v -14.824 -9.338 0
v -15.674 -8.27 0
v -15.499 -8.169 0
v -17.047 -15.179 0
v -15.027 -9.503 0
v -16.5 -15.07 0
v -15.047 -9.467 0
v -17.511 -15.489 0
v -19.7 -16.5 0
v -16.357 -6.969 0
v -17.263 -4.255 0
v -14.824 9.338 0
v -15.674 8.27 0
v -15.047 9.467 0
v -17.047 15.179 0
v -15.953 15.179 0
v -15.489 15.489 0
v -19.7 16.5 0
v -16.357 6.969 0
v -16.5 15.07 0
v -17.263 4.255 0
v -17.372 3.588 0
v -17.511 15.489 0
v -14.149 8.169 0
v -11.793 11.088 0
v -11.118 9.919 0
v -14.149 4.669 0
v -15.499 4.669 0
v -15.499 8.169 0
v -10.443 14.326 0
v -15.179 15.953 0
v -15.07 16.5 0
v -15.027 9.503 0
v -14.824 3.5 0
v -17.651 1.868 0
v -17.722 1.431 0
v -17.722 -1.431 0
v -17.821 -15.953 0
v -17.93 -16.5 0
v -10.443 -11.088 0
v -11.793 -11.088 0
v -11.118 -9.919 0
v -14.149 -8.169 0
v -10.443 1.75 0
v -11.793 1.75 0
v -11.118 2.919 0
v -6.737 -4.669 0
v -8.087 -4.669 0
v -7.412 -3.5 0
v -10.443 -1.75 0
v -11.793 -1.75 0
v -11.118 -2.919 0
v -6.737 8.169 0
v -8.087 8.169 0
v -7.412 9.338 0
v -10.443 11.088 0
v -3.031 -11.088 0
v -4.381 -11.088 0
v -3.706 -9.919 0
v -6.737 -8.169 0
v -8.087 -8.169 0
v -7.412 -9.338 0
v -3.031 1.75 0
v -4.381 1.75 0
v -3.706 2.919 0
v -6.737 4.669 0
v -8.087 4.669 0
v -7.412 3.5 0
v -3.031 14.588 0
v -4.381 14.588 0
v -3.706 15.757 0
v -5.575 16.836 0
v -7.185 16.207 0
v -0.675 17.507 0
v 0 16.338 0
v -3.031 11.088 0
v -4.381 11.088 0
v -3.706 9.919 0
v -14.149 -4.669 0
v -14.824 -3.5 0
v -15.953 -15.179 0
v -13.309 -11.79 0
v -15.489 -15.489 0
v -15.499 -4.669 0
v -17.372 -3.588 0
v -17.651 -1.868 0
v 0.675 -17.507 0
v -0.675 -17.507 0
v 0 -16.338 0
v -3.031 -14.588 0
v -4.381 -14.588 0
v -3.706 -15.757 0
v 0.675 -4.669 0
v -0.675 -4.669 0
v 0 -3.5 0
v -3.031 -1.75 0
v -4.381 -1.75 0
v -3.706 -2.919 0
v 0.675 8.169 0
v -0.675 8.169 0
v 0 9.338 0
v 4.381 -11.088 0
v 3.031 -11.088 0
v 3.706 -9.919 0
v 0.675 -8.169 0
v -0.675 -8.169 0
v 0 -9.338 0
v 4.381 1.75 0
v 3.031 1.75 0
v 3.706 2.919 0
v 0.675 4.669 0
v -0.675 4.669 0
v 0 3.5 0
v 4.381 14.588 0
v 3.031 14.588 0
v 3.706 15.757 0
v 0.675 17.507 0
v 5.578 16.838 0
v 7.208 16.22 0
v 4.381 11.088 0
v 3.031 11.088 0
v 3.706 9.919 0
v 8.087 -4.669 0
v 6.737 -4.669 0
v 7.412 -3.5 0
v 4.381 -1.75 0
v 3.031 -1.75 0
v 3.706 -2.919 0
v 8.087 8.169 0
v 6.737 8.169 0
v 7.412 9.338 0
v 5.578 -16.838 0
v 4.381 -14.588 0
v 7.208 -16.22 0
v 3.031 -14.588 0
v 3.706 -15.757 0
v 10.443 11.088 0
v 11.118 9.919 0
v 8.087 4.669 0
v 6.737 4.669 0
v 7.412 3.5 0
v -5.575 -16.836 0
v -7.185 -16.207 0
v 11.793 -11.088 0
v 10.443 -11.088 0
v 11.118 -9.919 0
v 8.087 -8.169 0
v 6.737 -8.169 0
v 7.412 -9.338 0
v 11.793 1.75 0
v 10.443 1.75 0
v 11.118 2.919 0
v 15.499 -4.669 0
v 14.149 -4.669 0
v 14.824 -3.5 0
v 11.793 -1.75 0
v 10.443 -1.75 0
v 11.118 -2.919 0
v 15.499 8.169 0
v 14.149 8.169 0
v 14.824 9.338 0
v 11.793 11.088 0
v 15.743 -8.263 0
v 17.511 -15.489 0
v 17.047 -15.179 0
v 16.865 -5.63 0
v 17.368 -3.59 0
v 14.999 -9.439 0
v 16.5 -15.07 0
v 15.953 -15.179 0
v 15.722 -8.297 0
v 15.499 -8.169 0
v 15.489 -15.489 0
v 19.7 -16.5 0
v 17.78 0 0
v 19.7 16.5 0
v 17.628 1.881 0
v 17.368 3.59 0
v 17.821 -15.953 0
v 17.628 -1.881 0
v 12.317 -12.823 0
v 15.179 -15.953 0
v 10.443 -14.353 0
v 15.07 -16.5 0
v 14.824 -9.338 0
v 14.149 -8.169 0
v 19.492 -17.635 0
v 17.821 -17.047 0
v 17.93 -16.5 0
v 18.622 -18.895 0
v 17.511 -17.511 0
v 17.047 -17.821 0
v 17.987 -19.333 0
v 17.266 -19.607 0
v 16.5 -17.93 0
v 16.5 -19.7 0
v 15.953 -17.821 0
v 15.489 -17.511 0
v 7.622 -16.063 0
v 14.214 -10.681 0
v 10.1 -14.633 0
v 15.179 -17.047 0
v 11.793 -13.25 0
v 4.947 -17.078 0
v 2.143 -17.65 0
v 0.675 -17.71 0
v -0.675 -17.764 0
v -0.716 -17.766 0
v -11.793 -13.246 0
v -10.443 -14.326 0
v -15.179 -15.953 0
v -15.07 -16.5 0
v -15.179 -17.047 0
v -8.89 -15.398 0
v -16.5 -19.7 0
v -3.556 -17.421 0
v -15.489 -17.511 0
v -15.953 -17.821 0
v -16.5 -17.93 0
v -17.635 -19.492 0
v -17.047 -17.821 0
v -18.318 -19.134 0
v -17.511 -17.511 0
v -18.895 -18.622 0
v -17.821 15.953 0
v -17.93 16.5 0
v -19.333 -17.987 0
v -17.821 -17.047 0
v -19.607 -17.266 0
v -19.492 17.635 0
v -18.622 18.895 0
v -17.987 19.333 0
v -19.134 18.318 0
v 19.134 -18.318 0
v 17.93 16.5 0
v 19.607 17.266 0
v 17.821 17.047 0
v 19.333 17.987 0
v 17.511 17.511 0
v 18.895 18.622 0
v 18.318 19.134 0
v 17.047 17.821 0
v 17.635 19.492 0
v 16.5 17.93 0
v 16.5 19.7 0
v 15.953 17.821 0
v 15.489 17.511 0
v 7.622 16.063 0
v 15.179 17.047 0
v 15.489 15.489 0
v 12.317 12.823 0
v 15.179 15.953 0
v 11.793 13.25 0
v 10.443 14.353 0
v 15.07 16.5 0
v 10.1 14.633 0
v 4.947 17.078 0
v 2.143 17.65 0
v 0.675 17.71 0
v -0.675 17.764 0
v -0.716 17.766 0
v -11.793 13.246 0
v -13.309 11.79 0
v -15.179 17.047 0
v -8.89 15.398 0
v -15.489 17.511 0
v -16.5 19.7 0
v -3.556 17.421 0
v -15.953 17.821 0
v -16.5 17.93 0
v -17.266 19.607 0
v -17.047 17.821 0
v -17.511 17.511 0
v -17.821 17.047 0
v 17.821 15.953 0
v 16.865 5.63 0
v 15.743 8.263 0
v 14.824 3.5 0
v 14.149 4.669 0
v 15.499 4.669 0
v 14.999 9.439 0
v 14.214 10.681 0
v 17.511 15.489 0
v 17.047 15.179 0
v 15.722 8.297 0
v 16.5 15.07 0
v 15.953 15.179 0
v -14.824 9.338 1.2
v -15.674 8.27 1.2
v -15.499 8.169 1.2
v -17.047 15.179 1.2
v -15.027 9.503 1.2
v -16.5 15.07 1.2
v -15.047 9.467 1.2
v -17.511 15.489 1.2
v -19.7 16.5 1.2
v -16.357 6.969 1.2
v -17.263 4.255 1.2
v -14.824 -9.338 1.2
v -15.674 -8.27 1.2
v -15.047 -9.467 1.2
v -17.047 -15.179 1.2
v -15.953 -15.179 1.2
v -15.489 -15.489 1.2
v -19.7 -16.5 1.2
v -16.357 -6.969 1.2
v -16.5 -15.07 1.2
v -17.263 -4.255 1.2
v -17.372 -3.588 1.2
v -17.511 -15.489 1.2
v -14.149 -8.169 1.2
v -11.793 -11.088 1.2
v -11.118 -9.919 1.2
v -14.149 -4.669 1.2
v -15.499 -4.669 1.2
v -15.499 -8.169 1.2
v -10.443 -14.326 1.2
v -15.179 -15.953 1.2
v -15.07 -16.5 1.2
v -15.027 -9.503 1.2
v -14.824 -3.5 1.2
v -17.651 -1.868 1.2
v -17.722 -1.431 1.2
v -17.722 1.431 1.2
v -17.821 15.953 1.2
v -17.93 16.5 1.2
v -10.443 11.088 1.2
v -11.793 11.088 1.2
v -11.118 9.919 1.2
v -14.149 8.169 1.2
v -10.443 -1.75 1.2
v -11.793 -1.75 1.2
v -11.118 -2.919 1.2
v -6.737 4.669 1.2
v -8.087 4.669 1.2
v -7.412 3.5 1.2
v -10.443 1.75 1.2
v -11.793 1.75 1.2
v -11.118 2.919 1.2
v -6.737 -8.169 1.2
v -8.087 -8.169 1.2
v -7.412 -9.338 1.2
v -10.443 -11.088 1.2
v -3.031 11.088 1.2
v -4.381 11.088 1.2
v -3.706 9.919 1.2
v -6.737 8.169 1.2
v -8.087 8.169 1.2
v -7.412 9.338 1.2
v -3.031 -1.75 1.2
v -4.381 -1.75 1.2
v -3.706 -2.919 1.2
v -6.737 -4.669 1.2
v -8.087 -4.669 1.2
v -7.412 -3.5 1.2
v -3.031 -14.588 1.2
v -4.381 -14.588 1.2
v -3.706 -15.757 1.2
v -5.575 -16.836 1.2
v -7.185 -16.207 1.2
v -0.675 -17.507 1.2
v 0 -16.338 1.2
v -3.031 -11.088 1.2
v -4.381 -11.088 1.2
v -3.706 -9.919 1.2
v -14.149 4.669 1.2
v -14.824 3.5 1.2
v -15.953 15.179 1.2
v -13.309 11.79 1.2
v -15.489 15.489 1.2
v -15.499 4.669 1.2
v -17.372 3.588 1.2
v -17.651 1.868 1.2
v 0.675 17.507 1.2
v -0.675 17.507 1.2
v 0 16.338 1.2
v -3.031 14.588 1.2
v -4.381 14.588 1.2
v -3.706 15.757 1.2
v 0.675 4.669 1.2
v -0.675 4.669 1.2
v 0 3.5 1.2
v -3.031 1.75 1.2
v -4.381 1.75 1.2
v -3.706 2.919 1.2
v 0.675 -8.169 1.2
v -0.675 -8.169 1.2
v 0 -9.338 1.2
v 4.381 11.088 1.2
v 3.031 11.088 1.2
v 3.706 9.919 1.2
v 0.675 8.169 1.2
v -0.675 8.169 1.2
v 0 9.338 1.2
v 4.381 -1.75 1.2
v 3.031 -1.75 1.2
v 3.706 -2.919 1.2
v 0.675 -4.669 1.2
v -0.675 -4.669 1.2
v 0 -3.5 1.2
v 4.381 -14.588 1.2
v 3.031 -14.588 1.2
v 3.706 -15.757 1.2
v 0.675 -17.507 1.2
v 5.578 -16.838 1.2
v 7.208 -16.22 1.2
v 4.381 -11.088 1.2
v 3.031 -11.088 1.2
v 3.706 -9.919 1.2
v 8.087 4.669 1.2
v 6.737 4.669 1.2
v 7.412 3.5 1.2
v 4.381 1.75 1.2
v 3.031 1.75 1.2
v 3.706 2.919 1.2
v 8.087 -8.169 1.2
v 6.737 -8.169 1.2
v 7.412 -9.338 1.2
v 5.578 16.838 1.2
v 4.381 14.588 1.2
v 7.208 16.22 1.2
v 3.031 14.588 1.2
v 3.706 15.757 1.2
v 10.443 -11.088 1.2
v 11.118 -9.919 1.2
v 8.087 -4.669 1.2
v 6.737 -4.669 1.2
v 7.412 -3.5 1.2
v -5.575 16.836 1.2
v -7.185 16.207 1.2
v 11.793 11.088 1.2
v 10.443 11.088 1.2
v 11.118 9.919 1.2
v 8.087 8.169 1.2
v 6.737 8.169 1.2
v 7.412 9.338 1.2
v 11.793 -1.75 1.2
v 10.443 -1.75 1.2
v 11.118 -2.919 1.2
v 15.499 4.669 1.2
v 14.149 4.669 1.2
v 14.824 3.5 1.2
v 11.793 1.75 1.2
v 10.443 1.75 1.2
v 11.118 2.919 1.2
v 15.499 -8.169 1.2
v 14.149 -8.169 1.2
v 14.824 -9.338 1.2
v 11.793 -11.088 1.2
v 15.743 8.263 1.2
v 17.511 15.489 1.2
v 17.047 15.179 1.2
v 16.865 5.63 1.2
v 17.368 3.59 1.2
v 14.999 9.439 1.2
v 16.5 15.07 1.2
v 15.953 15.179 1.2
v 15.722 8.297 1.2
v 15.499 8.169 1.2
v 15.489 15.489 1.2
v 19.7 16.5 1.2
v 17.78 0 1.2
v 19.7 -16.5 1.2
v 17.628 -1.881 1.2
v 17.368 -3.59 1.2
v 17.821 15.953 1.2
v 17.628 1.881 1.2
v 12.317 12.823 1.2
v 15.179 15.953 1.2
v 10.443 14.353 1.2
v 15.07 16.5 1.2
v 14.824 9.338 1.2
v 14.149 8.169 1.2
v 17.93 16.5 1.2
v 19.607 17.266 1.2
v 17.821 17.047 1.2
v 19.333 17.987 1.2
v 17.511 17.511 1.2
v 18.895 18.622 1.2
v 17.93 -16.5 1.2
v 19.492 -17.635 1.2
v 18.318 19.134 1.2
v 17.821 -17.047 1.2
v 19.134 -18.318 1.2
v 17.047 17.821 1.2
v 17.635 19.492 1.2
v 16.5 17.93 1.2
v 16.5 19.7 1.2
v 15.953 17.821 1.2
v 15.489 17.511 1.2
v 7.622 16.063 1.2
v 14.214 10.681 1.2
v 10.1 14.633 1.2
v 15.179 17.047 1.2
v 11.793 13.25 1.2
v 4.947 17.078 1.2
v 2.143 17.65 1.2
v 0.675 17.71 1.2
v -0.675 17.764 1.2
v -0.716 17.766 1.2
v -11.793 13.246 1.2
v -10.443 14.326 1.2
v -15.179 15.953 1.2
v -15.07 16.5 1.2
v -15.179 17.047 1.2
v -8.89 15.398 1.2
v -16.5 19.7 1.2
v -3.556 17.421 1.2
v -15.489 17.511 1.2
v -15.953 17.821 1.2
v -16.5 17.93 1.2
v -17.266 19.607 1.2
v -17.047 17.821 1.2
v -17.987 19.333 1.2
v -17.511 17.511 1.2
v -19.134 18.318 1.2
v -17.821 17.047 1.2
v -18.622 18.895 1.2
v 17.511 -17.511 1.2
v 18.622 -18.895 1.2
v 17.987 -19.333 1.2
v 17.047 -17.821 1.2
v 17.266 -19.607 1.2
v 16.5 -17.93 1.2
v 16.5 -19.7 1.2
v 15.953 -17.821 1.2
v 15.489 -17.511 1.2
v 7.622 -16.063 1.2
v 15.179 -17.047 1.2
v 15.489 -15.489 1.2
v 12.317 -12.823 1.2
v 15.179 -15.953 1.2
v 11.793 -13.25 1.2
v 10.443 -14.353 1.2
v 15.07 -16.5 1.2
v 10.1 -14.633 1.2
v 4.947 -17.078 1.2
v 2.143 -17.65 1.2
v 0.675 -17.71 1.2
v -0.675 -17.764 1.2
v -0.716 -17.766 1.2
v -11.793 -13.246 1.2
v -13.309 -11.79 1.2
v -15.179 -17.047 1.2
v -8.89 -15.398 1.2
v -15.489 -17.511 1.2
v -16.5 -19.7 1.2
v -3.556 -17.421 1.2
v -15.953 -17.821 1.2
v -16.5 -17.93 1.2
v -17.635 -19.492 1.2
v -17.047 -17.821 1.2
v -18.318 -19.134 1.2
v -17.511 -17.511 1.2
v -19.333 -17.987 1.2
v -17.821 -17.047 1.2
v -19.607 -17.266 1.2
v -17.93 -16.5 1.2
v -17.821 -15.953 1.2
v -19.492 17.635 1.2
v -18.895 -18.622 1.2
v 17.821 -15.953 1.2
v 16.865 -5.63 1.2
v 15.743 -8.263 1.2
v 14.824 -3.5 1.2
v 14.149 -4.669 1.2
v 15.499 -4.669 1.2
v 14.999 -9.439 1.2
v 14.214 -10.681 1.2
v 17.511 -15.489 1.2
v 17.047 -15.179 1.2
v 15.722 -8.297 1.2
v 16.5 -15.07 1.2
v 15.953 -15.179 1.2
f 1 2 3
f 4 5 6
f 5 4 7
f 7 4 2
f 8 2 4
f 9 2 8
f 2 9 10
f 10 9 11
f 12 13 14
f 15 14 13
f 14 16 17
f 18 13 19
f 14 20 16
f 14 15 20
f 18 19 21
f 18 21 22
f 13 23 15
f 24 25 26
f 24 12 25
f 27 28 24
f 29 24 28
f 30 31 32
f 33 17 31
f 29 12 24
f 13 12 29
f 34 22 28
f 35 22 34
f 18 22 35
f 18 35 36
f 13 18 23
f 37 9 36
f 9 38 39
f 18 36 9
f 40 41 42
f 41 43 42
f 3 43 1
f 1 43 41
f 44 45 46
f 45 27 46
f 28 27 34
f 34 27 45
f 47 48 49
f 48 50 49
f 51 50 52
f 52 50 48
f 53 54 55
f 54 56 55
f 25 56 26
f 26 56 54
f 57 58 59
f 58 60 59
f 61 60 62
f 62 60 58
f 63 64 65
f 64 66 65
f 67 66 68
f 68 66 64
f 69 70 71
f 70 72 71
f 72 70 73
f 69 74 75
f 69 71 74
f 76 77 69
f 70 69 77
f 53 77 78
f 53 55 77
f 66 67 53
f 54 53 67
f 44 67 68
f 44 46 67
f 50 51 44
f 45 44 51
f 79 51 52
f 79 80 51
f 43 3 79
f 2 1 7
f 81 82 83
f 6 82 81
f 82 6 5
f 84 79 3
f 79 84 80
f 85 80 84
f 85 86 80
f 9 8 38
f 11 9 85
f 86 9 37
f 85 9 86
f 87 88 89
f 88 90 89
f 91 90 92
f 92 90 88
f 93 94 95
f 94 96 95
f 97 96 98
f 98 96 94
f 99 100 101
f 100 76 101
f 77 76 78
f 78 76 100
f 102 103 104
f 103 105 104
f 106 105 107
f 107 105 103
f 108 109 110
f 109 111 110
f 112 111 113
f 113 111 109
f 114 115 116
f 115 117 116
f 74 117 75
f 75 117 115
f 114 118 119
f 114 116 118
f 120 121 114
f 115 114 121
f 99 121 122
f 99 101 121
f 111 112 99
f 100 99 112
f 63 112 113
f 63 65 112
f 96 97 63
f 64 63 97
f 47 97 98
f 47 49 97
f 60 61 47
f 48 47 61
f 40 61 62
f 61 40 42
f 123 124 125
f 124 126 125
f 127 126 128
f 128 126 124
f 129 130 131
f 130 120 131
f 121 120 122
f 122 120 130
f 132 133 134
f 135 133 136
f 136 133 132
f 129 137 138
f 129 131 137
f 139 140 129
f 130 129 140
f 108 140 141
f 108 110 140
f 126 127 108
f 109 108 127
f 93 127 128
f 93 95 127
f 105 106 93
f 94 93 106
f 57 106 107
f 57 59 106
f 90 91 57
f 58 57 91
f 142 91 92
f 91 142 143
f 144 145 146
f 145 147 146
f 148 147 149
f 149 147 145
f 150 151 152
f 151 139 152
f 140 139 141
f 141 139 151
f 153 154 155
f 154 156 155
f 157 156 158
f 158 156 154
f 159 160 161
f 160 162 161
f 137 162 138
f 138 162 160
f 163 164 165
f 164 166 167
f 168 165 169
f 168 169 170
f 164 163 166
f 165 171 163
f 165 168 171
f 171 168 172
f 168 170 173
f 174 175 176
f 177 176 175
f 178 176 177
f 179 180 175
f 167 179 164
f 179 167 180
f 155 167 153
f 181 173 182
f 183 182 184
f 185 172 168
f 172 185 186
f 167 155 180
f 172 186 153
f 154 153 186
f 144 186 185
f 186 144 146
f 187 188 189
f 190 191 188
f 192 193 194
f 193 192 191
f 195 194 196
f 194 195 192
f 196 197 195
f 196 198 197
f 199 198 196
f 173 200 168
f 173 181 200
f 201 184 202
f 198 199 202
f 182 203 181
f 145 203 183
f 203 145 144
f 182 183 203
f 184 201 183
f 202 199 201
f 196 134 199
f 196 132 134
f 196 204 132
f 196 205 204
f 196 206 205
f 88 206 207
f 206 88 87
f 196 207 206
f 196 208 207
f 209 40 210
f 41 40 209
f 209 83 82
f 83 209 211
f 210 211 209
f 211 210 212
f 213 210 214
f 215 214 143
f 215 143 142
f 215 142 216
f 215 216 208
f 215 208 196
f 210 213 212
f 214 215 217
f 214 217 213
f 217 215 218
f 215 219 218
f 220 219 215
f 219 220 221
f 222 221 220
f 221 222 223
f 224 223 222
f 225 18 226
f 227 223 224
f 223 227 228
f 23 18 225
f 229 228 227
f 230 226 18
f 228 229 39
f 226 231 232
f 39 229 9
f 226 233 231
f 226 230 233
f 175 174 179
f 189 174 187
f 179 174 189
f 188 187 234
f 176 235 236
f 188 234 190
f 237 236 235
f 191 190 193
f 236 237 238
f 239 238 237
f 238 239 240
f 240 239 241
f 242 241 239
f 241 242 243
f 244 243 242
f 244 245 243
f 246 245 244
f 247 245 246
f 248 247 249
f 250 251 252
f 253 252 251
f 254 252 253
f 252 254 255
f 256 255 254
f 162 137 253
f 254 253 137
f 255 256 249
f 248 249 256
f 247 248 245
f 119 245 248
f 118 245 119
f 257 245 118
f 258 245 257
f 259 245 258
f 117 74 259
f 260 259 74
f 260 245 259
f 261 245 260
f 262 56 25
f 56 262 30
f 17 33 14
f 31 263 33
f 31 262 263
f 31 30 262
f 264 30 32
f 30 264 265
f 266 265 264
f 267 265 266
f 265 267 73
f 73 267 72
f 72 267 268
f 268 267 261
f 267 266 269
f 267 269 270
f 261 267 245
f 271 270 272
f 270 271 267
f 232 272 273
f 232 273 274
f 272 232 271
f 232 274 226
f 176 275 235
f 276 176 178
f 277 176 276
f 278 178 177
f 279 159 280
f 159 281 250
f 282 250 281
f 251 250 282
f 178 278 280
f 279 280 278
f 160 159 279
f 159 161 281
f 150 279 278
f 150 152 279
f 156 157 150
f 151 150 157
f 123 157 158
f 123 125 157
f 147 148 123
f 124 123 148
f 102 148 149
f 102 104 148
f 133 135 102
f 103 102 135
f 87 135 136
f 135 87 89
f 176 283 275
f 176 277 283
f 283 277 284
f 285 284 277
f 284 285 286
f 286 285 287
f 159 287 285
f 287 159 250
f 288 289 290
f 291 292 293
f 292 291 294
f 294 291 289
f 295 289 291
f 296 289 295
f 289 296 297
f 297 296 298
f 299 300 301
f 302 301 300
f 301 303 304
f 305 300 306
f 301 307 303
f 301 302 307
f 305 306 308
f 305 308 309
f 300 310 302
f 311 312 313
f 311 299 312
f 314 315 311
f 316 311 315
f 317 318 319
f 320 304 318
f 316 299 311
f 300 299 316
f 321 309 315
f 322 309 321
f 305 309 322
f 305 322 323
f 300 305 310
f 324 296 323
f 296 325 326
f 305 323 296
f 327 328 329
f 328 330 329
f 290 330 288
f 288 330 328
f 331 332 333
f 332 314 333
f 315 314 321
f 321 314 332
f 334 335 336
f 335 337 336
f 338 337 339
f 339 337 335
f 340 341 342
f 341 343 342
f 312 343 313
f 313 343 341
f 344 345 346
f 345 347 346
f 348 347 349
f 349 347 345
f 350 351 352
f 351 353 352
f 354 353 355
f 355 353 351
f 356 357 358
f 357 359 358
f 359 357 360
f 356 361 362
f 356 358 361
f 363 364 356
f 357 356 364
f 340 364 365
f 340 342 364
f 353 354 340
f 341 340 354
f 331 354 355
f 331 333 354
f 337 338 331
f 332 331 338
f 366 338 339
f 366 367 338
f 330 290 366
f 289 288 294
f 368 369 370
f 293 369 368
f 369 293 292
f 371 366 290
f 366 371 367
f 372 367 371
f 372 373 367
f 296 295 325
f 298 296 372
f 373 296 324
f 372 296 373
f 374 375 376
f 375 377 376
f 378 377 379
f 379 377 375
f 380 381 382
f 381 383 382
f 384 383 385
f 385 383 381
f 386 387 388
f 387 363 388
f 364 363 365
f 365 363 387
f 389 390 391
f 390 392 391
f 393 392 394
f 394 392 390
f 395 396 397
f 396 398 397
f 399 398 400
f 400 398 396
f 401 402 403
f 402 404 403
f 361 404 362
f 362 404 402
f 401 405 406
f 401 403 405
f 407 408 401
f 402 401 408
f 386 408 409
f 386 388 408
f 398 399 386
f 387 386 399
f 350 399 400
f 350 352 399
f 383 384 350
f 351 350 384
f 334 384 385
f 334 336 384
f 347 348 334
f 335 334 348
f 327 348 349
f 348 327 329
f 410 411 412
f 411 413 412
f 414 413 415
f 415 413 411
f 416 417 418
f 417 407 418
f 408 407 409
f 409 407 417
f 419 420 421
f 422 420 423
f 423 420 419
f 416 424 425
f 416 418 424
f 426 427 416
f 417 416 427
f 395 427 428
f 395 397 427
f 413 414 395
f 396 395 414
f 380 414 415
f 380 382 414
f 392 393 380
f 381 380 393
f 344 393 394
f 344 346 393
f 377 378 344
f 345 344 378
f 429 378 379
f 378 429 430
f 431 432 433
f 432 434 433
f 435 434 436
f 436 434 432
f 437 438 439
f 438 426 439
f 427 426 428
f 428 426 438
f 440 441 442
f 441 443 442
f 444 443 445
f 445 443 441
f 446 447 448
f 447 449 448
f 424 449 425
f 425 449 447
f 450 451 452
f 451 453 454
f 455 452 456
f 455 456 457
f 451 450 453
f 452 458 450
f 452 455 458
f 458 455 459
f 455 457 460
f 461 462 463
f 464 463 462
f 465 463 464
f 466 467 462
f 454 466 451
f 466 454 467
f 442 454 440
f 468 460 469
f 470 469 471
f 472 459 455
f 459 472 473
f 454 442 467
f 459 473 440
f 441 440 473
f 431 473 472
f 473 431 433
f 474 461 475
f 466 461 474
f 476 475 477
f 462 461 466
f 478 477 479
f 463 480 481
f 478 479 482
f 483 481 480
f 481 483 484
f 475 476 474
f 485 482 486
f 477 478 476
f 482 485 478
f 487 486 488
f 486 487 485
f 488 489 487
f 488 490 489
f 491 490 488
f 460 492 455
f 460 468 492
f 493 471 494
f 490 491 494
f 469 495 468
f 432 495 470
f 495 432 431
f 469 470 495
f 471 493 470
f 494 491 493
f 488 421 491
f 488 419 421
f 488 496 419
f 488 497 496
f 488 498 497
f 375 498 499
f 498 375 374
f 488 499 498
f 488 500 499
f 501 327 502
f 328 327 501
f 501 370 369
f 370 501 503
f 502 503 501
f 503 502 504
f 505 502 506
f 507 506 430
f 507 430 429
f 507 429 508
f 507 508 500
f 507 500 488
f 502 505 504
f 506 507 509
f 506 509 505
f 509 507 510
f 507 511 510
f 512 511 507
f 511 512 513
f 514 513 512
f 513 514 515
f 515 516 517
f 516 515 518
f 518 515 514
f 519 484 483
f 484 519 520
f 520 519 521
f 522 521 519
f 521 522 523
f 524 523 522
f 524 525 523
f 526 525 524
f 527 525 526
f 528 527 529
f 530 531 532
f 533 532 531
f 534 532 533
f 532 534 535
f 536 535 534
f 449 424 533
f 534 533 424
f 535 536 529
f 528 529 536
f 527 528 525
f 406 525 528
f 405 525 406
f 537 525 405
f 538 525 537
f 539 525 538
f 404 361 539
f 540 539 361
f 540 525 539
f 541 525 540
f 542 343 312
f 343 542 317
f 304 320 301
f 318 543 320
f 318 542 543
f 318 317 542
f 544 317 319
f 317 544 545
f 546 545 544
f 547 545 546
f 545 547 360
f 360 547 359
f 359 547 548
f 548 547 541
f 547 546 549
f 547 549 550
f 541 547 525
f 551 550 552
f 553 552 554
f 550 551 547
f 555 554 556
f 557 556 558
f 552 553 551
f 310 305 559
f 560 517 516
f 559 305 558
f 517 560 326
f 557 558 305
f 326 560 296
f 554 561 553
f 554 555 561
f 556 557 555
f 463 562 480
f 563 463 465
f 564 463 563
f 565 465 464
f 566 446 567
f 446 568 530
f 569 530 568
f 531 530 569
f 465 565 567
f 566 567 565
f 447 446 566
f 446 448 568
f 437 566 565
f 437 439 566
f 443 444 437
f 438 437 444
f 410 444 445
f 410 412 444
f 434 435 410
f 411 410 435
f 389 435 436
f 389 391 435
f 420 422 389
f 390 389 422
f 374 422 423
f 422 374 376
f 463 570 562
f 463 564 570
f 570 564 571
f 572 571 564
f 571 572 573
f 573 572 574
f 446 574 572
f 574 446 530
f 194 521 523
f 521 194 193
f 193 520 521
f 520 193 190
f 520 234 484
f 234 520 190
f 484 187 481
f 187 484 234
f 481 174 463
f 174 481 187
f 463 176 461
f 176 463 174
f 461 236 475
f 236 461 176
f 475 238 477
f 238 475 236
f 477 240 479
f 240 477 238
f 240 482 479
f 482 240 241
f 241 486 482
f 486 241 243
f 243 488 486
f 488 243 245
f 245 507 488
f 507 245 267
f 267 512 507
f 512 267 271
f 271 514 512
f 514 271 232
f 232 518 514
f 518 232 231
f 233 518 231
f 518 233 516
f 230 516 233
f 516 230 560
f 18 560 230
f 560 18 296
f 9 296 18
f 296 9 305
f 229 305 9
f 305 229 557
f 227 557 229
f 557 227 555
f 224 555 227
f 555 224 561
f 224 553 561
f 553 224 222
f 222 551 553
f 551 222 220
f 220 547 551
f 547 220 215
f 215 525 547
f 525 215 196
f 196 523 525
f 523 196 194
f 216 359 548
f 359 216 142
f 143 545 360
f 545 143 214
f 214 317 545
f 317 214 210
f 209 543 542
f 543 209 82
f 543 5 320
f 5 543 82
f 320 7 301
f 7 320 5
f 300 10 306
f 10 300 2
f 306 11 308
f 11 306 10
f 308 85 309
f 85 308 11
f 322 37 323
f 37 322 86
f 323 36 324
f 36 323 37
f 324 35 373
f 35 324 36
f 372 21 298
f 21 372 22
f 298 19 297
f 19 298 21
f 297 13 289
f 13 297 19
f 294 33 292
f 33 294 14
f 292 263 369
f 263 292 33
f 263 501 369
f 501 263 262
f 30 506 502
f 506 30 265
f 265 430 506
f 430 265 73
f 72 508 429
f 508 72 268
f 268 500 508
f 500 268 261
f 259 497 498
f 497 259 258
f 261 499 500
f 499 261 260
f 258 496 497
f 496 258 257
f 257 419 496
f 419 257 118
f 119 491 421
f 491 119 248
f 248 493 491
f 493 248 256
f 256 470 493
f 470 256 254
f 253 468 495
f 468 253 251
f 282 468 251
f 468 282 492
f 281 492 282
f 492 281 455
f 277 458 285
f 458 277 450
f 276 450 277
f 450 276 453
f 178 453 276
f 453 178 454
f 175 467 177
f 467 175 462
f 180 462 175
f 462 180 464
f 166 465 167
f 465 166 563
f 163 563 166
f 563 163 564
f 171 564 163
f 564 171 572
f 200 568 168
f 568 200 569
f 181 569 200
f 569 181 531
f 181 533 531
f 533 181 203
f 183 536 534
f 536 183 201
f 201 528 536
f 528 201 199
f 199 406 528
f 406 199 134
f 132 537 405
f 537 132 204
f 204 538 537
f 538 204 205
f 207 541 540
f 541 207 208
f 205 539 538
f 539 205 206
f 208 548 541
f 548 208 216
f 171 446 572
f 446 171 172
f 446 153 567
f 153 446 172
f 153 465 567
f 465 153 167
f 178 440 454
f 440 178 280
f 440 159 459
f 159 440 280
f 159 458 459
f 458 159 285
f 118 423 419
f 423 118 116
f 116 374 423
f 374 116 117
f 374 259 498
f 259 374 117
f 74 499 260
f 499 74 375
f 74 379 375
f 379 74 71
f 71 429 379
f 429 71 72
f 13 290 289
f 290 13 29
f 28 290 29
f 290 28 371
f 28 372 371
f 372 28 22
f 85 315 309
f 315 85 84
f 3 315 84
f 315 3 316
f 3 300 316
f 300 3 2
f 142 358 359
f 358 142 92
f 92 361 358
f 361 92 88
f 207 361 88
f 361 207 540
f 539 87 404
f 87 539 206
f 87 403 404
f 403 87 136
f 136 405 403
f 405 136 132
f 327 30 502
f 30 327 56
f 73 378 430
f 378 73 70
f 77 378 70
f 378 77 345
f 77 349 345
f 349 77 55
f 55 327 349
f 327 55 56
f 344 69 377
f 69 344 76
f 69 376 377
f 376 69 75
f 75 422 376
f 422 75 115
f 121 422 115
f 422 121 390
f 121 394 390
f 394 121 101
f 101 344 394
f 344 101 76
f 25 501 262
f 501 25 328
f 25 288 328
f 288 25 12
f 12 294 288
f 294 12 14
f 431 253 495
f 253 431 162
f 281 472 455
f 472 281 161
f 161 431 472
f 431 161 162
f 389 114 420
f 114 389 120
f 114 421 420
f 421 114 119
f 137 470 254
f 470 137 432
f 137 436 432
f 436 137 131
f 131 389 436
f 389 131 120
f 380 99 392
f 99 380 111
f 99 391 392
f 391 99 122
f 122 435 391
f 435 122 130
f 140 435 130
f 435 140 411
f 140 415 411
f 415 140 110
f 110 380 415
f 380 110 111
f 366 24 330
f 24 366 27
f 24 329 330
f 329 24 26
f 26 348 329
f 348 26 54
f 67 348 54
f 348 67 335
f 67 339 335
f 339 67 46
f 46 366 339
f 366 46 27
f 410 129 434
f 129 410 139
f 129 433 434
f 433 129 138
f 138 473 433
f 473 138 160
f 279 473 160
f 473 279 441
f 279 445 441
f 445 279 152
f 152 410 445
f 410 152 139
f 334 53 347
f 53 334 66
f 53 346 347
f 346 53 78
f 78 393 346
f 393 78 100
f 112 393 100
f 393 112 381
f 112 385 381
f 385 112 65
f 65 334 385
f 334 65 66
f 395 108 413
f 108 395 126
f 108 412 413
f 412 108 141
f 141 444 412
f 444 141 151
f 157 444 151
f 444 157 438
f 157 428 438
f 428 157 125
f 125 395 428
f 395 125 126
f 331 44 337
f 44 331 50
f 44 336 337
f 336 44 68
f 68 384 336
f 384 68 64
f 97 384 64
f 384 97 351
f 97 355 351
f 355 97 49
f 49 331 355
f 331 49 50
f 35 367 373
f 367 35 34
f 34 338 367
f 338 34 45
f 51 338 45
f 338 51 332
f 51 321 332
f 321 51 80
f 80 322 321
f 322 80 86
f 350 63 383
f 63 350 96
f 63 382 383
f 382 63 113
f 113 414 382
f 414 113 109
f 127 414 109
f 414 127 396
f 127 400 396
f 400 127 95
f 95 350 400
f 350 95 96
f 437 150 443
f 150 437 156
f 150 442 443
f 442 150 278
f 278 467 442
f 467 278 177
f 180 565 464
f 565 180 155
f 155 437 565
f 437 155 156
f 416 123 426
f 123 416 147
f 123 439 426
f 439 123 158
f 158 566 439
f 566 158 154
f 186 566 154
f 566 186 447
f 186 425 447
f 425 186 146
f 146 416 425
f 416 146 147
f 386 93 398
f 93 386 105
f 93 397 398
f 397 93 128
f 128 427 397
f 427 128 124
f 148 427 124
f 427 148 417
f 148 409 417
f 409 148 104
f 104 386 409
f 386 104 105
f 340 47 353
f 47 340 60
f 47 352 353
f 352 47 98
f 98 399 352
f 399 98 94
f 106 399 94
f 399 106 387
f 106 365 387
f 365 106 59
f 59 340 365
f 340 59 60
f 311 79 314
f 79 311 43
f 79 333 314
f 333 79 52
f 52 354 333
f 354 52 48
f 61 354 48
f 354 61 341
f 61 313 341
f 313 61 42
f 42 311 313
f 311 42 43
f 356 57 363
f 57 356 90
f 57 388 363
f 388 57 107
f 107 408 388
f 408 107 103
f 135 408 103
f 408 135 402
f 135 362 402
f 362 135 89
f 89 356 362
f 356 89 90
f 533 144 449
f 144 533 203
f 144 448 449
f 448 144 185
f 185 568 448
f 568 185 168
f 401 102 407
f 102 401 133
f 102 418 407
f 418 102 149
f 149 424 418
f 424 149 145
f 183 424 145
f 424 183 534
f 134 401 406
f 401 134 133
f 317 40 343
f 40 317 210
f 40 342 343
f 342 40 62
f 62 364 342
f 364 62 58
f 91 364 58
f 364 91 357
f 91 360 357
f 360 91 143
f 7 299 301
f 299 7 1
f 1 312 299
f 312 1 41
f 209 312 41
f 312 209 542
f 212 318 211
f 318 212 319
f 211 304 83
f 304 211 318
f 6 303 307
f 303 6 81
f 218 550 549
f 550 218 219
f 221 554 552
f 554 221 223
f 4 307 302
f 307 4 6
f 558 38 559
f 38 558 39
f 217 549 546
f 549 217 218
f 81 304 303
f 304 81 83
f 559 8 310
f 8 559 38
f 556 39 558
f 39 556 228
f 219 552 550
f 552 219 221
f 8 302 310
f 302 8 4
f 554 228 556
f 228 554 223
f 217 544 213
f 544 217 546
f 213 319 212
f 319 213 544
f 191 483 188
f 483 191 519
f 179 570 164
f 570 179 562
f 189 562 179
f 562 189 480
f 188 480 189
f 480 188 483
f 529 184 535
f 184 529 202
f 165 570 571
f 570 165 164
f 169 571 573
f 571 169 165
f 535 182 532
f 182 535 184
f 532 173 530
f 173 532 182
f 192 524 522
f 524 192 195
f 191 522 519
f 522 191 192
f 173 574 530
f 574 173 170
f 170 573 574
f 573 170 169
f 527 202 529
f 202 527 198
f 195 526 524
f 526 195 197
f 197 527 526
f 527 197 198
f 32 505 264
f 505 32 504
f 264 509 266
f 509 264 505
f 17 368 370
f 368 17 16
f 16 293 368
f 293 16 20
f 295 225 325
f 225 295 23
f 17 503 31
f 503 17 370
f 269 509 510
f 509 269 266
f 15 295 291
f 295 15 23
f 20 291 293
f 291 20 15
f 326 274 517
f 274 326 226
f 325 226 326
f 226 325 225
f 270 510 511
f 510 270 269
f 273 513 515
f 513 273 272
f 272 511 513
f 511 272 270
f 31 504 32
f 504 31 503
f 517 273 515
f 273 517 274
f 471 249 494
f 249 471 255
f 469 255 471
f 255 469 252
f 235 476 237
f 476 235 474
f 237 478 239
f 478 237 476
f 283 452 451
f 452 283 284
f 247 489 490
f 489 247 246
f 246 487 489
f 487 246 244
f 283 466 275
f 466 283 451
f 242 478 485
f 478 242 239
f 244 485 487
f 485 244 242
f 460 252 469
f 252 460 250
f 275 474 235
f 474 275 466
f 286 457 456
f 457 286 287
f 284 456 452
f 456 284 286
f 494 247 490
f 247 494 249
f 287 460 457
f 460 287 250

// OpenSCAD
/*
 * Customizable Fan Cover - https://www.thingiverse.com/thing:2802474
 * by Dennis Hofmann - https://www.thingiverse.com/mightynozzle/about
 * created 2018-02-22
 * updated 2018-03-27
 * version v1.2
 *
 * Changelog
 * --------------
 * v1.2:
 *      - better quality of rounded corners and crosshair pattern
 * v1.1:
 *      - added support line option for crosshair and square pattern
 * v1.0:
 *      - final design
 * --------------
 *
 * This work is licensed under the Creative Commons - Attribution - Non-Commercial - ShareAlike license.
 * https://creativecommons.org/licenses/by-nc-sa/3.0/
 */


 // Parameter Section //
//-------------------//

/* [Global Settings] */

// Choose between presets of known and common fan sizes.
fan_preset = "custom"; //[25:25mm,30:30mm,40:40mm,50:50mm,60:60mm,70:70mm,80:80mm,92:92mm,120:120mm,140:140mm,custom:Custom Fan Settings]

// If you want save to save about 40% filament and about 20% printing time, you can choose the reduced frame option.
frame_option = "full"; //[full,reduced]

// Minimum Border Size. I recommend to use two/four/six... times of your line width setting of your slicer. Simplify3D uses 0.48mm line width by default if you are using a 0.4mm nozzle. Cura uses 0.4mm line width.
min_border_size_in_millimeter = 1.92;

// Choose between a grill pattern
grill_pattern = "honeycomb"; //[honeycomb,grid,line,triangle,crosshair,square,dot,aperture]

// Set the angle of the pattern around the center of the cover.
grill_pattern_rotation = 0; //[0:5:360]

// Size of the pattern lines. I recommend to use two/four/six... times of your line width setting of your slicer. Simplify3D uses 0.48mm line width by default if you are using a 0.4mm nozzle. Cura uses 0.4mm line width.
line_size_in_millimter = 1.35; //[0.3:0.02:4]

// Space between two lines of your pattern. If you choose aperture pattern, this value set the size of the center octagon.
line_space_in_millimeter = 7; //[1:0.1:50]

// If you need countersunk holes, you can activate it here. Bottom = first layer. Top = last layer. 
screw_hole_chamfer = "no"; //[no,top,bottom,top_and_bottom]

// Activate or deactivate rounded corners. The radius will be automatically calculated.
rounded_corners = "yes"; //[yes,no]

// number of straight lines supporting the crosshair or square pattern.
number_of_support_lines = 2;  //[1:1:36]

/* [Custom Fan Settings] */

// Cover size. E.g. 80 for a 80mm Fan
cover_size_in_millimeter = 39.4;

// E.g. 2.9 for M2.5, 3.3 for M3, 4.4 for M4
screw_hole_diameter_in_millimeter = 2.86;

// 25mm fan: 20 | 30mm fan: 24 | 40mm fan: 32 | 50mm fan: 40 | 60mm fan: 50 | 70mm fan: 61.5 | 80mm fan: 71.5 | 92mm fan: 82.5 | 120mm fan: 105 | 140mm fan: 126 
screw_hole_distance_in_millimeter = 33;

// Height of the outer frame of the cover
cover_height_in_millimeter = 1.2;

// Height of the pattern inside the cover frame
grill_pattern_height_in_millimeter = 1.2;

/* [Hidden] */
min_border_size = min_border_size_in_millimeter;
line_size = line_size_in_millimter;
line_space = line_space_in_millimeter;

 // Program Section //
//-----------------//

if(fan_preset == "25") {
    fan_cover(cover_size = 25, screw_hole_dia = 2.9, screw_hole_distance = 20, cover_h = 2, grill_pattern_h = 1);
}
if(fan_preset == "30") {
    fan_cover(cover_size = 30, screw_hole_dia = 3.3, screw_hole_distance = 24, cover_h = 2.5, grill_pattern_h = 1.1);
}
if(fan_preset == "40") {
    fan_cover(cover_size = 40, screw_hole_dia = 3.3, screw_hole_distance = 32, cover_h = 2.7, grill_pattern_h = 1.2);
}
if(fan_preset == "50") {
    fan_cover(cover_size = 50, screw_hole_dia = 4.4, screw_hole_distance = 40, cover_h = 2.9, grill_pattern_h = 1.3);
}
if(fan_preset == "60") {
    fan_cover(cover_size = 60, screw_hole_dia = 4.4, screw_hole_distance = 50, cover_h = 3, grill_pattern_h = 1.3);
}
if(fan_preset == "70") {
    fan_cover(cover_size = 70, screw_hole_dia = 4.4, screw_hole_distance = 61.5, cover_h = 3, grill_pattern_h = 1.4);
}
if(fan_preset == "80") {
    fan_cover(cover_size = 80, screw_hole_dia = 4.4, screw_hole_distance = 71.5, cover_h = 3.2, grill_pattern_h = 1.5);
}
if(fan_preset == "92") {
    fan_cover(cover_size = 92, screw_hole_dia = 4.4, screw_hole_distance = 82.5, cover_h = 3.5, grill_pattern_h = 1.6);
}
if(fan_preset == "120") {
    fan_cover(cover_size = 120, screw_hole_dia = 4.4, screw_hole_distance = 105, cover_h = 4, grill_pattern_h = 1.8);
}
if(fan_preset == "140") {
    fan_cover(cover_size = 140, screw_hole_dia = 4.4, screw_hole_distance = 126, cover_h = 4.5, grill_pattern_h = 2.0);
}
if(fan_preset == "custom") {
    fan_cover(cover_size = cover_size_in_millimeter, screw_hole_dia = screw_hole_diameter_in_millimeter, screw_hole_distance = screw_hole_distance_in_millimeter, cover_h = cover_height_in_millimeter, grill_pattern_h = grill_pattern_height_in_millimeter);
}


 // Module Section //
//----------------//

module fan_cover(cover_size, screw_hole_dia, screw_hole_distance, cover_h, grill_pattern_h) {
    corner_size = cover_size - screw_hole_distance;
    corner_r = rounded_corners == "yes" ? corner_size / 2 : 0;
    screw_pos = (cover_size - corner_size) / 2;
    color("DodgerBlue") difference() {
        union() {
            linear_extrude(height = cover_h, convexity = 20) {
                difference() {
                    offset(r=corner_r, $fn = ceil(corner_r * 8)) {
                        offset(r=-corner_r) {
                            square([cover_size, cover_size], center = true);
                        }
                    }
                    if(frame_option == "reduced") {
                        offset(r=corner_r, $fn = ceil(corner_r * 8)) {
                            offset(r=-corner_r) {
                                square([cover_size - min_border_size*2, cover_size - min_border_size*2], center = true);
                            }
                        }
                    }
                    if(frame_option == "full") {
                        circle(d = cover_size - min_border_size * 2, $fn = cover_size);
                    }
                } 
                if(frame_option == "reduced") {
                    for(y = [-1:2:1]) {
                        for(x = [-1:2:1]) {
                            translate([screw_pos * x, screw_pos * y, -2]) {
                                circle(d = corner_size, $fn = ceil(corner_r * 8));
                            }
                        }
                    }
                }
            }
            linear_extrude(height = grill_pattern_h, convexity = 20) {
                intersection() {
                    offset(r=corner_r, $fn = ceil(corner_r * 8)) {
                        offset(r=-corner_r) {
                            square([cover_size, cover_size], center = true);
                        }
                    }
                    rotate(grill_pattern_rotation) {
                        if(grill_pattern == "honeycomb") {
                            honeycomb_pattern(cover_size, line_size, line_space);
                        }
                        if(grill_pattern == "grid") {
                            grid_pattern(cover_size, line_size, line_space);
                        }
                        if(grill_pattern == "line") {
                            line_pattern(cover_size, line_size, line_space);
                        }
                        if(grill_pattern == "triangle") {
                            triangle_pattern(cover_size, line_size, line_space);
                        }
                        if(grill_pattern == "crosshair") {
                            crosshair_pattern(cover_size, line_size, line_space);
                        }
                        if(grill_pattern == "square") {
                            square_pattern(cover_size, line_size, line_space);
                        }
                        if(grill_pattern == "dot") {
                            dot_pattern(cover_size, line_size, line_space);
                        }
                        if(grill_pattern == "aperture") {
                            aperture_pattern(cover_size, line_size, line_space);
                        }
                        
                    }
                }
            }
        }
        for(y = [-1:2:1]) {
            for(x = [-1:2:1]) {
                translate([screw_pos * x, screw_pos * y, -2]) {
                    screw_hole(cover_h, screw_hole_dia);
                }
            }
        }
    }
}

module screw_hole(cover_h, screw_hole_dia) {
    cylinder(h = cover_h + 4, d = screw_hole_dia, $fn = 16);
    if(screw_hole_chamfer == "bottom" || screw_hole_chamfer == "top_and_bottom") {
        translate([0, 0, 2.9 - screw_hole_dia]) {
            cylinder(h = screw_hole_dia, d1 = screw_hole_dia * 4, d2 = screw_hole_dia);
        }
    }
    if(screw_hole_chamfer == "top" || screw_hole_chamfer == "top_and_bottom") {
        translate([0, 0, cover_h + screw_hole_dia/4]) {
            cylinder(h = screw_hole_dia, d2 = screw_hole_dia * 4, d1 = screw_hole_dia);
        }
    }
}

module grid_pattern(size, line_size, line_space) {
    num = ceil(size / (line_size + line_space) * 1.42);
    for(x = [floor(-num / 2) : ceil(num / 2)]) {
        translate([x * (line_size + line_space), 0]) {
            square([line_size, num *(line_size + line_space)], center=true);
        }
        rotate(90) {
            translate([x * (line_size + line_space), 0]) {
                square([line_size, num *(line_size + line_space)], center = true);
            }
        }
    }
}

module triangle_pattern(size, line_size, line_space) {
    num = ceil(size / (line_size + line_space) * 1.42);
    for(x = [floor(-num / 2):ceil(num / 2)]) {
        translate([x * (line_size + line_space), 0]) {
            square([line_size, num *(line_size + line_space)], center = true);
        }
        rotate(60) {
            translate([x * (line_size + line_space), 0]) {
                square([line_size, num *(line_size + line_space)], center = true);
            }
        }
        rotate(120) {
            translate([x * (line_size + line_space), 0]) {
                square([line_size, num *(line_size + line_space)], center = true);
            }
        }
    }
}

module line_pattern(size, line_size, line_space) {
    num = ceil(size / (line_size + line_space)*1.42);
    for(x = [floor(-num / 2):ceil(num / 2)]) {
        translate([x * (line_size + line_space), 0]) {
            square([line_size, num *(line_size + line_space)], center=true);
        }
    }
}

module crosshair_pattern(size, line_size, line_space) {
    line = (line_size + line_space) * 2;
    num = ceil(size / line * 1.42);
    for(n = [1:num]) {
        difference() {
            circle(d = n * line + line_size * 2, $fn = ceil(n * line + line_size * 2));
            circle(d = n * line, $fn = ceil(n * line + line_size * 2));
        }
    }
    for(rot=[0:90 / number_of_support_lines * 2:180]) {
        rotate(rot + 45) square([size * 2, line_size], center = true);
    }
}

module square_pattern(size, line_size, line_space) {
    line = (line_size + line_space) * 2;
    num = ceil(size / line * 1.42); 
    for(n = [1:num]) {
        difference() {
            square([n * line + line_size * 2, n * line + line_size * 2], center = true);
            square([n * line, n * line], center = true);
        }
    }
    for(rot=[0:90 / number_of_support_lines * 2:180]) {
        rotate(rot + 45) square([size * 2, line_size], center = true);
    }
}

module honeycomb_pattern(size, line_size, line_space) {
    min_rad = (line_space / 2 * sqrt(3)) / 2 + line_size / 2;
    y_offset = sqrt(min_rad * min_rad * 4 - min_rad * min_rad);
    num_x = ceil(size / min_rad / 2) * 1.42;
    num_y = ceil(size / y_offset) * 1.42;
    difference() {
        square([size * 1.42, size * 1.42], center = true);
        for(y = [floor(-num_y / 2) : ceil(num_y / 2)]) {
            odd = (y % 2 == 0) ? 0 : min_rad;
            for(x = [floor(-num_x / 2) : ceil(num_x / 2)]) {
                translate([x * min_rad * 2 + odd, y * y_offset]) {
                    rotate(30) {
                        circle(d=line_space, $fn=6);
                    }
                }
            }
        }
    }
}

module dot_pattern(size, line_size, line_space) {
    rad = line_space / 2;
    y_offset = sqrt((rad + line_size / 2) * (rad + line_size / 2) * 4 - (rad + line_size / 2) * (rad + line_size / 2));
    num_x = ceil(size / rad / 2) * 1.42;
    num_y = ceil(size / y_offset) * 1.42;
    difference() {
        square([size * 1.42, size * 1.42], center = true);
        for(y = [floor(-num_y / 2) : ceil(num_y / 2)]) {
            odd = (y % 2 == 0) ? 0 : rad + line_size / 2;
            for(x = [floor(-num_x / 2) : ceil(num_x / 2)]) {
                translate([x * (rad + line_size / 2) * 2 + odd, y * y_offset]) {
                    rotate(30) {
                        circle(d=line_space);
                    }
                }
            }
        }
    }
}

module aperture_pattern(size, line_size, line_space) {
    circle(d = line_space, $fn = 8);
    for(rot = [1:2:15]) {
        rotate(360 / 16 * rot) {
            translate([line_space / 2 * cos(360 / 16) - line_size, -line_size]) {
                square([line_size, size]);
            }
        }
    }
}
